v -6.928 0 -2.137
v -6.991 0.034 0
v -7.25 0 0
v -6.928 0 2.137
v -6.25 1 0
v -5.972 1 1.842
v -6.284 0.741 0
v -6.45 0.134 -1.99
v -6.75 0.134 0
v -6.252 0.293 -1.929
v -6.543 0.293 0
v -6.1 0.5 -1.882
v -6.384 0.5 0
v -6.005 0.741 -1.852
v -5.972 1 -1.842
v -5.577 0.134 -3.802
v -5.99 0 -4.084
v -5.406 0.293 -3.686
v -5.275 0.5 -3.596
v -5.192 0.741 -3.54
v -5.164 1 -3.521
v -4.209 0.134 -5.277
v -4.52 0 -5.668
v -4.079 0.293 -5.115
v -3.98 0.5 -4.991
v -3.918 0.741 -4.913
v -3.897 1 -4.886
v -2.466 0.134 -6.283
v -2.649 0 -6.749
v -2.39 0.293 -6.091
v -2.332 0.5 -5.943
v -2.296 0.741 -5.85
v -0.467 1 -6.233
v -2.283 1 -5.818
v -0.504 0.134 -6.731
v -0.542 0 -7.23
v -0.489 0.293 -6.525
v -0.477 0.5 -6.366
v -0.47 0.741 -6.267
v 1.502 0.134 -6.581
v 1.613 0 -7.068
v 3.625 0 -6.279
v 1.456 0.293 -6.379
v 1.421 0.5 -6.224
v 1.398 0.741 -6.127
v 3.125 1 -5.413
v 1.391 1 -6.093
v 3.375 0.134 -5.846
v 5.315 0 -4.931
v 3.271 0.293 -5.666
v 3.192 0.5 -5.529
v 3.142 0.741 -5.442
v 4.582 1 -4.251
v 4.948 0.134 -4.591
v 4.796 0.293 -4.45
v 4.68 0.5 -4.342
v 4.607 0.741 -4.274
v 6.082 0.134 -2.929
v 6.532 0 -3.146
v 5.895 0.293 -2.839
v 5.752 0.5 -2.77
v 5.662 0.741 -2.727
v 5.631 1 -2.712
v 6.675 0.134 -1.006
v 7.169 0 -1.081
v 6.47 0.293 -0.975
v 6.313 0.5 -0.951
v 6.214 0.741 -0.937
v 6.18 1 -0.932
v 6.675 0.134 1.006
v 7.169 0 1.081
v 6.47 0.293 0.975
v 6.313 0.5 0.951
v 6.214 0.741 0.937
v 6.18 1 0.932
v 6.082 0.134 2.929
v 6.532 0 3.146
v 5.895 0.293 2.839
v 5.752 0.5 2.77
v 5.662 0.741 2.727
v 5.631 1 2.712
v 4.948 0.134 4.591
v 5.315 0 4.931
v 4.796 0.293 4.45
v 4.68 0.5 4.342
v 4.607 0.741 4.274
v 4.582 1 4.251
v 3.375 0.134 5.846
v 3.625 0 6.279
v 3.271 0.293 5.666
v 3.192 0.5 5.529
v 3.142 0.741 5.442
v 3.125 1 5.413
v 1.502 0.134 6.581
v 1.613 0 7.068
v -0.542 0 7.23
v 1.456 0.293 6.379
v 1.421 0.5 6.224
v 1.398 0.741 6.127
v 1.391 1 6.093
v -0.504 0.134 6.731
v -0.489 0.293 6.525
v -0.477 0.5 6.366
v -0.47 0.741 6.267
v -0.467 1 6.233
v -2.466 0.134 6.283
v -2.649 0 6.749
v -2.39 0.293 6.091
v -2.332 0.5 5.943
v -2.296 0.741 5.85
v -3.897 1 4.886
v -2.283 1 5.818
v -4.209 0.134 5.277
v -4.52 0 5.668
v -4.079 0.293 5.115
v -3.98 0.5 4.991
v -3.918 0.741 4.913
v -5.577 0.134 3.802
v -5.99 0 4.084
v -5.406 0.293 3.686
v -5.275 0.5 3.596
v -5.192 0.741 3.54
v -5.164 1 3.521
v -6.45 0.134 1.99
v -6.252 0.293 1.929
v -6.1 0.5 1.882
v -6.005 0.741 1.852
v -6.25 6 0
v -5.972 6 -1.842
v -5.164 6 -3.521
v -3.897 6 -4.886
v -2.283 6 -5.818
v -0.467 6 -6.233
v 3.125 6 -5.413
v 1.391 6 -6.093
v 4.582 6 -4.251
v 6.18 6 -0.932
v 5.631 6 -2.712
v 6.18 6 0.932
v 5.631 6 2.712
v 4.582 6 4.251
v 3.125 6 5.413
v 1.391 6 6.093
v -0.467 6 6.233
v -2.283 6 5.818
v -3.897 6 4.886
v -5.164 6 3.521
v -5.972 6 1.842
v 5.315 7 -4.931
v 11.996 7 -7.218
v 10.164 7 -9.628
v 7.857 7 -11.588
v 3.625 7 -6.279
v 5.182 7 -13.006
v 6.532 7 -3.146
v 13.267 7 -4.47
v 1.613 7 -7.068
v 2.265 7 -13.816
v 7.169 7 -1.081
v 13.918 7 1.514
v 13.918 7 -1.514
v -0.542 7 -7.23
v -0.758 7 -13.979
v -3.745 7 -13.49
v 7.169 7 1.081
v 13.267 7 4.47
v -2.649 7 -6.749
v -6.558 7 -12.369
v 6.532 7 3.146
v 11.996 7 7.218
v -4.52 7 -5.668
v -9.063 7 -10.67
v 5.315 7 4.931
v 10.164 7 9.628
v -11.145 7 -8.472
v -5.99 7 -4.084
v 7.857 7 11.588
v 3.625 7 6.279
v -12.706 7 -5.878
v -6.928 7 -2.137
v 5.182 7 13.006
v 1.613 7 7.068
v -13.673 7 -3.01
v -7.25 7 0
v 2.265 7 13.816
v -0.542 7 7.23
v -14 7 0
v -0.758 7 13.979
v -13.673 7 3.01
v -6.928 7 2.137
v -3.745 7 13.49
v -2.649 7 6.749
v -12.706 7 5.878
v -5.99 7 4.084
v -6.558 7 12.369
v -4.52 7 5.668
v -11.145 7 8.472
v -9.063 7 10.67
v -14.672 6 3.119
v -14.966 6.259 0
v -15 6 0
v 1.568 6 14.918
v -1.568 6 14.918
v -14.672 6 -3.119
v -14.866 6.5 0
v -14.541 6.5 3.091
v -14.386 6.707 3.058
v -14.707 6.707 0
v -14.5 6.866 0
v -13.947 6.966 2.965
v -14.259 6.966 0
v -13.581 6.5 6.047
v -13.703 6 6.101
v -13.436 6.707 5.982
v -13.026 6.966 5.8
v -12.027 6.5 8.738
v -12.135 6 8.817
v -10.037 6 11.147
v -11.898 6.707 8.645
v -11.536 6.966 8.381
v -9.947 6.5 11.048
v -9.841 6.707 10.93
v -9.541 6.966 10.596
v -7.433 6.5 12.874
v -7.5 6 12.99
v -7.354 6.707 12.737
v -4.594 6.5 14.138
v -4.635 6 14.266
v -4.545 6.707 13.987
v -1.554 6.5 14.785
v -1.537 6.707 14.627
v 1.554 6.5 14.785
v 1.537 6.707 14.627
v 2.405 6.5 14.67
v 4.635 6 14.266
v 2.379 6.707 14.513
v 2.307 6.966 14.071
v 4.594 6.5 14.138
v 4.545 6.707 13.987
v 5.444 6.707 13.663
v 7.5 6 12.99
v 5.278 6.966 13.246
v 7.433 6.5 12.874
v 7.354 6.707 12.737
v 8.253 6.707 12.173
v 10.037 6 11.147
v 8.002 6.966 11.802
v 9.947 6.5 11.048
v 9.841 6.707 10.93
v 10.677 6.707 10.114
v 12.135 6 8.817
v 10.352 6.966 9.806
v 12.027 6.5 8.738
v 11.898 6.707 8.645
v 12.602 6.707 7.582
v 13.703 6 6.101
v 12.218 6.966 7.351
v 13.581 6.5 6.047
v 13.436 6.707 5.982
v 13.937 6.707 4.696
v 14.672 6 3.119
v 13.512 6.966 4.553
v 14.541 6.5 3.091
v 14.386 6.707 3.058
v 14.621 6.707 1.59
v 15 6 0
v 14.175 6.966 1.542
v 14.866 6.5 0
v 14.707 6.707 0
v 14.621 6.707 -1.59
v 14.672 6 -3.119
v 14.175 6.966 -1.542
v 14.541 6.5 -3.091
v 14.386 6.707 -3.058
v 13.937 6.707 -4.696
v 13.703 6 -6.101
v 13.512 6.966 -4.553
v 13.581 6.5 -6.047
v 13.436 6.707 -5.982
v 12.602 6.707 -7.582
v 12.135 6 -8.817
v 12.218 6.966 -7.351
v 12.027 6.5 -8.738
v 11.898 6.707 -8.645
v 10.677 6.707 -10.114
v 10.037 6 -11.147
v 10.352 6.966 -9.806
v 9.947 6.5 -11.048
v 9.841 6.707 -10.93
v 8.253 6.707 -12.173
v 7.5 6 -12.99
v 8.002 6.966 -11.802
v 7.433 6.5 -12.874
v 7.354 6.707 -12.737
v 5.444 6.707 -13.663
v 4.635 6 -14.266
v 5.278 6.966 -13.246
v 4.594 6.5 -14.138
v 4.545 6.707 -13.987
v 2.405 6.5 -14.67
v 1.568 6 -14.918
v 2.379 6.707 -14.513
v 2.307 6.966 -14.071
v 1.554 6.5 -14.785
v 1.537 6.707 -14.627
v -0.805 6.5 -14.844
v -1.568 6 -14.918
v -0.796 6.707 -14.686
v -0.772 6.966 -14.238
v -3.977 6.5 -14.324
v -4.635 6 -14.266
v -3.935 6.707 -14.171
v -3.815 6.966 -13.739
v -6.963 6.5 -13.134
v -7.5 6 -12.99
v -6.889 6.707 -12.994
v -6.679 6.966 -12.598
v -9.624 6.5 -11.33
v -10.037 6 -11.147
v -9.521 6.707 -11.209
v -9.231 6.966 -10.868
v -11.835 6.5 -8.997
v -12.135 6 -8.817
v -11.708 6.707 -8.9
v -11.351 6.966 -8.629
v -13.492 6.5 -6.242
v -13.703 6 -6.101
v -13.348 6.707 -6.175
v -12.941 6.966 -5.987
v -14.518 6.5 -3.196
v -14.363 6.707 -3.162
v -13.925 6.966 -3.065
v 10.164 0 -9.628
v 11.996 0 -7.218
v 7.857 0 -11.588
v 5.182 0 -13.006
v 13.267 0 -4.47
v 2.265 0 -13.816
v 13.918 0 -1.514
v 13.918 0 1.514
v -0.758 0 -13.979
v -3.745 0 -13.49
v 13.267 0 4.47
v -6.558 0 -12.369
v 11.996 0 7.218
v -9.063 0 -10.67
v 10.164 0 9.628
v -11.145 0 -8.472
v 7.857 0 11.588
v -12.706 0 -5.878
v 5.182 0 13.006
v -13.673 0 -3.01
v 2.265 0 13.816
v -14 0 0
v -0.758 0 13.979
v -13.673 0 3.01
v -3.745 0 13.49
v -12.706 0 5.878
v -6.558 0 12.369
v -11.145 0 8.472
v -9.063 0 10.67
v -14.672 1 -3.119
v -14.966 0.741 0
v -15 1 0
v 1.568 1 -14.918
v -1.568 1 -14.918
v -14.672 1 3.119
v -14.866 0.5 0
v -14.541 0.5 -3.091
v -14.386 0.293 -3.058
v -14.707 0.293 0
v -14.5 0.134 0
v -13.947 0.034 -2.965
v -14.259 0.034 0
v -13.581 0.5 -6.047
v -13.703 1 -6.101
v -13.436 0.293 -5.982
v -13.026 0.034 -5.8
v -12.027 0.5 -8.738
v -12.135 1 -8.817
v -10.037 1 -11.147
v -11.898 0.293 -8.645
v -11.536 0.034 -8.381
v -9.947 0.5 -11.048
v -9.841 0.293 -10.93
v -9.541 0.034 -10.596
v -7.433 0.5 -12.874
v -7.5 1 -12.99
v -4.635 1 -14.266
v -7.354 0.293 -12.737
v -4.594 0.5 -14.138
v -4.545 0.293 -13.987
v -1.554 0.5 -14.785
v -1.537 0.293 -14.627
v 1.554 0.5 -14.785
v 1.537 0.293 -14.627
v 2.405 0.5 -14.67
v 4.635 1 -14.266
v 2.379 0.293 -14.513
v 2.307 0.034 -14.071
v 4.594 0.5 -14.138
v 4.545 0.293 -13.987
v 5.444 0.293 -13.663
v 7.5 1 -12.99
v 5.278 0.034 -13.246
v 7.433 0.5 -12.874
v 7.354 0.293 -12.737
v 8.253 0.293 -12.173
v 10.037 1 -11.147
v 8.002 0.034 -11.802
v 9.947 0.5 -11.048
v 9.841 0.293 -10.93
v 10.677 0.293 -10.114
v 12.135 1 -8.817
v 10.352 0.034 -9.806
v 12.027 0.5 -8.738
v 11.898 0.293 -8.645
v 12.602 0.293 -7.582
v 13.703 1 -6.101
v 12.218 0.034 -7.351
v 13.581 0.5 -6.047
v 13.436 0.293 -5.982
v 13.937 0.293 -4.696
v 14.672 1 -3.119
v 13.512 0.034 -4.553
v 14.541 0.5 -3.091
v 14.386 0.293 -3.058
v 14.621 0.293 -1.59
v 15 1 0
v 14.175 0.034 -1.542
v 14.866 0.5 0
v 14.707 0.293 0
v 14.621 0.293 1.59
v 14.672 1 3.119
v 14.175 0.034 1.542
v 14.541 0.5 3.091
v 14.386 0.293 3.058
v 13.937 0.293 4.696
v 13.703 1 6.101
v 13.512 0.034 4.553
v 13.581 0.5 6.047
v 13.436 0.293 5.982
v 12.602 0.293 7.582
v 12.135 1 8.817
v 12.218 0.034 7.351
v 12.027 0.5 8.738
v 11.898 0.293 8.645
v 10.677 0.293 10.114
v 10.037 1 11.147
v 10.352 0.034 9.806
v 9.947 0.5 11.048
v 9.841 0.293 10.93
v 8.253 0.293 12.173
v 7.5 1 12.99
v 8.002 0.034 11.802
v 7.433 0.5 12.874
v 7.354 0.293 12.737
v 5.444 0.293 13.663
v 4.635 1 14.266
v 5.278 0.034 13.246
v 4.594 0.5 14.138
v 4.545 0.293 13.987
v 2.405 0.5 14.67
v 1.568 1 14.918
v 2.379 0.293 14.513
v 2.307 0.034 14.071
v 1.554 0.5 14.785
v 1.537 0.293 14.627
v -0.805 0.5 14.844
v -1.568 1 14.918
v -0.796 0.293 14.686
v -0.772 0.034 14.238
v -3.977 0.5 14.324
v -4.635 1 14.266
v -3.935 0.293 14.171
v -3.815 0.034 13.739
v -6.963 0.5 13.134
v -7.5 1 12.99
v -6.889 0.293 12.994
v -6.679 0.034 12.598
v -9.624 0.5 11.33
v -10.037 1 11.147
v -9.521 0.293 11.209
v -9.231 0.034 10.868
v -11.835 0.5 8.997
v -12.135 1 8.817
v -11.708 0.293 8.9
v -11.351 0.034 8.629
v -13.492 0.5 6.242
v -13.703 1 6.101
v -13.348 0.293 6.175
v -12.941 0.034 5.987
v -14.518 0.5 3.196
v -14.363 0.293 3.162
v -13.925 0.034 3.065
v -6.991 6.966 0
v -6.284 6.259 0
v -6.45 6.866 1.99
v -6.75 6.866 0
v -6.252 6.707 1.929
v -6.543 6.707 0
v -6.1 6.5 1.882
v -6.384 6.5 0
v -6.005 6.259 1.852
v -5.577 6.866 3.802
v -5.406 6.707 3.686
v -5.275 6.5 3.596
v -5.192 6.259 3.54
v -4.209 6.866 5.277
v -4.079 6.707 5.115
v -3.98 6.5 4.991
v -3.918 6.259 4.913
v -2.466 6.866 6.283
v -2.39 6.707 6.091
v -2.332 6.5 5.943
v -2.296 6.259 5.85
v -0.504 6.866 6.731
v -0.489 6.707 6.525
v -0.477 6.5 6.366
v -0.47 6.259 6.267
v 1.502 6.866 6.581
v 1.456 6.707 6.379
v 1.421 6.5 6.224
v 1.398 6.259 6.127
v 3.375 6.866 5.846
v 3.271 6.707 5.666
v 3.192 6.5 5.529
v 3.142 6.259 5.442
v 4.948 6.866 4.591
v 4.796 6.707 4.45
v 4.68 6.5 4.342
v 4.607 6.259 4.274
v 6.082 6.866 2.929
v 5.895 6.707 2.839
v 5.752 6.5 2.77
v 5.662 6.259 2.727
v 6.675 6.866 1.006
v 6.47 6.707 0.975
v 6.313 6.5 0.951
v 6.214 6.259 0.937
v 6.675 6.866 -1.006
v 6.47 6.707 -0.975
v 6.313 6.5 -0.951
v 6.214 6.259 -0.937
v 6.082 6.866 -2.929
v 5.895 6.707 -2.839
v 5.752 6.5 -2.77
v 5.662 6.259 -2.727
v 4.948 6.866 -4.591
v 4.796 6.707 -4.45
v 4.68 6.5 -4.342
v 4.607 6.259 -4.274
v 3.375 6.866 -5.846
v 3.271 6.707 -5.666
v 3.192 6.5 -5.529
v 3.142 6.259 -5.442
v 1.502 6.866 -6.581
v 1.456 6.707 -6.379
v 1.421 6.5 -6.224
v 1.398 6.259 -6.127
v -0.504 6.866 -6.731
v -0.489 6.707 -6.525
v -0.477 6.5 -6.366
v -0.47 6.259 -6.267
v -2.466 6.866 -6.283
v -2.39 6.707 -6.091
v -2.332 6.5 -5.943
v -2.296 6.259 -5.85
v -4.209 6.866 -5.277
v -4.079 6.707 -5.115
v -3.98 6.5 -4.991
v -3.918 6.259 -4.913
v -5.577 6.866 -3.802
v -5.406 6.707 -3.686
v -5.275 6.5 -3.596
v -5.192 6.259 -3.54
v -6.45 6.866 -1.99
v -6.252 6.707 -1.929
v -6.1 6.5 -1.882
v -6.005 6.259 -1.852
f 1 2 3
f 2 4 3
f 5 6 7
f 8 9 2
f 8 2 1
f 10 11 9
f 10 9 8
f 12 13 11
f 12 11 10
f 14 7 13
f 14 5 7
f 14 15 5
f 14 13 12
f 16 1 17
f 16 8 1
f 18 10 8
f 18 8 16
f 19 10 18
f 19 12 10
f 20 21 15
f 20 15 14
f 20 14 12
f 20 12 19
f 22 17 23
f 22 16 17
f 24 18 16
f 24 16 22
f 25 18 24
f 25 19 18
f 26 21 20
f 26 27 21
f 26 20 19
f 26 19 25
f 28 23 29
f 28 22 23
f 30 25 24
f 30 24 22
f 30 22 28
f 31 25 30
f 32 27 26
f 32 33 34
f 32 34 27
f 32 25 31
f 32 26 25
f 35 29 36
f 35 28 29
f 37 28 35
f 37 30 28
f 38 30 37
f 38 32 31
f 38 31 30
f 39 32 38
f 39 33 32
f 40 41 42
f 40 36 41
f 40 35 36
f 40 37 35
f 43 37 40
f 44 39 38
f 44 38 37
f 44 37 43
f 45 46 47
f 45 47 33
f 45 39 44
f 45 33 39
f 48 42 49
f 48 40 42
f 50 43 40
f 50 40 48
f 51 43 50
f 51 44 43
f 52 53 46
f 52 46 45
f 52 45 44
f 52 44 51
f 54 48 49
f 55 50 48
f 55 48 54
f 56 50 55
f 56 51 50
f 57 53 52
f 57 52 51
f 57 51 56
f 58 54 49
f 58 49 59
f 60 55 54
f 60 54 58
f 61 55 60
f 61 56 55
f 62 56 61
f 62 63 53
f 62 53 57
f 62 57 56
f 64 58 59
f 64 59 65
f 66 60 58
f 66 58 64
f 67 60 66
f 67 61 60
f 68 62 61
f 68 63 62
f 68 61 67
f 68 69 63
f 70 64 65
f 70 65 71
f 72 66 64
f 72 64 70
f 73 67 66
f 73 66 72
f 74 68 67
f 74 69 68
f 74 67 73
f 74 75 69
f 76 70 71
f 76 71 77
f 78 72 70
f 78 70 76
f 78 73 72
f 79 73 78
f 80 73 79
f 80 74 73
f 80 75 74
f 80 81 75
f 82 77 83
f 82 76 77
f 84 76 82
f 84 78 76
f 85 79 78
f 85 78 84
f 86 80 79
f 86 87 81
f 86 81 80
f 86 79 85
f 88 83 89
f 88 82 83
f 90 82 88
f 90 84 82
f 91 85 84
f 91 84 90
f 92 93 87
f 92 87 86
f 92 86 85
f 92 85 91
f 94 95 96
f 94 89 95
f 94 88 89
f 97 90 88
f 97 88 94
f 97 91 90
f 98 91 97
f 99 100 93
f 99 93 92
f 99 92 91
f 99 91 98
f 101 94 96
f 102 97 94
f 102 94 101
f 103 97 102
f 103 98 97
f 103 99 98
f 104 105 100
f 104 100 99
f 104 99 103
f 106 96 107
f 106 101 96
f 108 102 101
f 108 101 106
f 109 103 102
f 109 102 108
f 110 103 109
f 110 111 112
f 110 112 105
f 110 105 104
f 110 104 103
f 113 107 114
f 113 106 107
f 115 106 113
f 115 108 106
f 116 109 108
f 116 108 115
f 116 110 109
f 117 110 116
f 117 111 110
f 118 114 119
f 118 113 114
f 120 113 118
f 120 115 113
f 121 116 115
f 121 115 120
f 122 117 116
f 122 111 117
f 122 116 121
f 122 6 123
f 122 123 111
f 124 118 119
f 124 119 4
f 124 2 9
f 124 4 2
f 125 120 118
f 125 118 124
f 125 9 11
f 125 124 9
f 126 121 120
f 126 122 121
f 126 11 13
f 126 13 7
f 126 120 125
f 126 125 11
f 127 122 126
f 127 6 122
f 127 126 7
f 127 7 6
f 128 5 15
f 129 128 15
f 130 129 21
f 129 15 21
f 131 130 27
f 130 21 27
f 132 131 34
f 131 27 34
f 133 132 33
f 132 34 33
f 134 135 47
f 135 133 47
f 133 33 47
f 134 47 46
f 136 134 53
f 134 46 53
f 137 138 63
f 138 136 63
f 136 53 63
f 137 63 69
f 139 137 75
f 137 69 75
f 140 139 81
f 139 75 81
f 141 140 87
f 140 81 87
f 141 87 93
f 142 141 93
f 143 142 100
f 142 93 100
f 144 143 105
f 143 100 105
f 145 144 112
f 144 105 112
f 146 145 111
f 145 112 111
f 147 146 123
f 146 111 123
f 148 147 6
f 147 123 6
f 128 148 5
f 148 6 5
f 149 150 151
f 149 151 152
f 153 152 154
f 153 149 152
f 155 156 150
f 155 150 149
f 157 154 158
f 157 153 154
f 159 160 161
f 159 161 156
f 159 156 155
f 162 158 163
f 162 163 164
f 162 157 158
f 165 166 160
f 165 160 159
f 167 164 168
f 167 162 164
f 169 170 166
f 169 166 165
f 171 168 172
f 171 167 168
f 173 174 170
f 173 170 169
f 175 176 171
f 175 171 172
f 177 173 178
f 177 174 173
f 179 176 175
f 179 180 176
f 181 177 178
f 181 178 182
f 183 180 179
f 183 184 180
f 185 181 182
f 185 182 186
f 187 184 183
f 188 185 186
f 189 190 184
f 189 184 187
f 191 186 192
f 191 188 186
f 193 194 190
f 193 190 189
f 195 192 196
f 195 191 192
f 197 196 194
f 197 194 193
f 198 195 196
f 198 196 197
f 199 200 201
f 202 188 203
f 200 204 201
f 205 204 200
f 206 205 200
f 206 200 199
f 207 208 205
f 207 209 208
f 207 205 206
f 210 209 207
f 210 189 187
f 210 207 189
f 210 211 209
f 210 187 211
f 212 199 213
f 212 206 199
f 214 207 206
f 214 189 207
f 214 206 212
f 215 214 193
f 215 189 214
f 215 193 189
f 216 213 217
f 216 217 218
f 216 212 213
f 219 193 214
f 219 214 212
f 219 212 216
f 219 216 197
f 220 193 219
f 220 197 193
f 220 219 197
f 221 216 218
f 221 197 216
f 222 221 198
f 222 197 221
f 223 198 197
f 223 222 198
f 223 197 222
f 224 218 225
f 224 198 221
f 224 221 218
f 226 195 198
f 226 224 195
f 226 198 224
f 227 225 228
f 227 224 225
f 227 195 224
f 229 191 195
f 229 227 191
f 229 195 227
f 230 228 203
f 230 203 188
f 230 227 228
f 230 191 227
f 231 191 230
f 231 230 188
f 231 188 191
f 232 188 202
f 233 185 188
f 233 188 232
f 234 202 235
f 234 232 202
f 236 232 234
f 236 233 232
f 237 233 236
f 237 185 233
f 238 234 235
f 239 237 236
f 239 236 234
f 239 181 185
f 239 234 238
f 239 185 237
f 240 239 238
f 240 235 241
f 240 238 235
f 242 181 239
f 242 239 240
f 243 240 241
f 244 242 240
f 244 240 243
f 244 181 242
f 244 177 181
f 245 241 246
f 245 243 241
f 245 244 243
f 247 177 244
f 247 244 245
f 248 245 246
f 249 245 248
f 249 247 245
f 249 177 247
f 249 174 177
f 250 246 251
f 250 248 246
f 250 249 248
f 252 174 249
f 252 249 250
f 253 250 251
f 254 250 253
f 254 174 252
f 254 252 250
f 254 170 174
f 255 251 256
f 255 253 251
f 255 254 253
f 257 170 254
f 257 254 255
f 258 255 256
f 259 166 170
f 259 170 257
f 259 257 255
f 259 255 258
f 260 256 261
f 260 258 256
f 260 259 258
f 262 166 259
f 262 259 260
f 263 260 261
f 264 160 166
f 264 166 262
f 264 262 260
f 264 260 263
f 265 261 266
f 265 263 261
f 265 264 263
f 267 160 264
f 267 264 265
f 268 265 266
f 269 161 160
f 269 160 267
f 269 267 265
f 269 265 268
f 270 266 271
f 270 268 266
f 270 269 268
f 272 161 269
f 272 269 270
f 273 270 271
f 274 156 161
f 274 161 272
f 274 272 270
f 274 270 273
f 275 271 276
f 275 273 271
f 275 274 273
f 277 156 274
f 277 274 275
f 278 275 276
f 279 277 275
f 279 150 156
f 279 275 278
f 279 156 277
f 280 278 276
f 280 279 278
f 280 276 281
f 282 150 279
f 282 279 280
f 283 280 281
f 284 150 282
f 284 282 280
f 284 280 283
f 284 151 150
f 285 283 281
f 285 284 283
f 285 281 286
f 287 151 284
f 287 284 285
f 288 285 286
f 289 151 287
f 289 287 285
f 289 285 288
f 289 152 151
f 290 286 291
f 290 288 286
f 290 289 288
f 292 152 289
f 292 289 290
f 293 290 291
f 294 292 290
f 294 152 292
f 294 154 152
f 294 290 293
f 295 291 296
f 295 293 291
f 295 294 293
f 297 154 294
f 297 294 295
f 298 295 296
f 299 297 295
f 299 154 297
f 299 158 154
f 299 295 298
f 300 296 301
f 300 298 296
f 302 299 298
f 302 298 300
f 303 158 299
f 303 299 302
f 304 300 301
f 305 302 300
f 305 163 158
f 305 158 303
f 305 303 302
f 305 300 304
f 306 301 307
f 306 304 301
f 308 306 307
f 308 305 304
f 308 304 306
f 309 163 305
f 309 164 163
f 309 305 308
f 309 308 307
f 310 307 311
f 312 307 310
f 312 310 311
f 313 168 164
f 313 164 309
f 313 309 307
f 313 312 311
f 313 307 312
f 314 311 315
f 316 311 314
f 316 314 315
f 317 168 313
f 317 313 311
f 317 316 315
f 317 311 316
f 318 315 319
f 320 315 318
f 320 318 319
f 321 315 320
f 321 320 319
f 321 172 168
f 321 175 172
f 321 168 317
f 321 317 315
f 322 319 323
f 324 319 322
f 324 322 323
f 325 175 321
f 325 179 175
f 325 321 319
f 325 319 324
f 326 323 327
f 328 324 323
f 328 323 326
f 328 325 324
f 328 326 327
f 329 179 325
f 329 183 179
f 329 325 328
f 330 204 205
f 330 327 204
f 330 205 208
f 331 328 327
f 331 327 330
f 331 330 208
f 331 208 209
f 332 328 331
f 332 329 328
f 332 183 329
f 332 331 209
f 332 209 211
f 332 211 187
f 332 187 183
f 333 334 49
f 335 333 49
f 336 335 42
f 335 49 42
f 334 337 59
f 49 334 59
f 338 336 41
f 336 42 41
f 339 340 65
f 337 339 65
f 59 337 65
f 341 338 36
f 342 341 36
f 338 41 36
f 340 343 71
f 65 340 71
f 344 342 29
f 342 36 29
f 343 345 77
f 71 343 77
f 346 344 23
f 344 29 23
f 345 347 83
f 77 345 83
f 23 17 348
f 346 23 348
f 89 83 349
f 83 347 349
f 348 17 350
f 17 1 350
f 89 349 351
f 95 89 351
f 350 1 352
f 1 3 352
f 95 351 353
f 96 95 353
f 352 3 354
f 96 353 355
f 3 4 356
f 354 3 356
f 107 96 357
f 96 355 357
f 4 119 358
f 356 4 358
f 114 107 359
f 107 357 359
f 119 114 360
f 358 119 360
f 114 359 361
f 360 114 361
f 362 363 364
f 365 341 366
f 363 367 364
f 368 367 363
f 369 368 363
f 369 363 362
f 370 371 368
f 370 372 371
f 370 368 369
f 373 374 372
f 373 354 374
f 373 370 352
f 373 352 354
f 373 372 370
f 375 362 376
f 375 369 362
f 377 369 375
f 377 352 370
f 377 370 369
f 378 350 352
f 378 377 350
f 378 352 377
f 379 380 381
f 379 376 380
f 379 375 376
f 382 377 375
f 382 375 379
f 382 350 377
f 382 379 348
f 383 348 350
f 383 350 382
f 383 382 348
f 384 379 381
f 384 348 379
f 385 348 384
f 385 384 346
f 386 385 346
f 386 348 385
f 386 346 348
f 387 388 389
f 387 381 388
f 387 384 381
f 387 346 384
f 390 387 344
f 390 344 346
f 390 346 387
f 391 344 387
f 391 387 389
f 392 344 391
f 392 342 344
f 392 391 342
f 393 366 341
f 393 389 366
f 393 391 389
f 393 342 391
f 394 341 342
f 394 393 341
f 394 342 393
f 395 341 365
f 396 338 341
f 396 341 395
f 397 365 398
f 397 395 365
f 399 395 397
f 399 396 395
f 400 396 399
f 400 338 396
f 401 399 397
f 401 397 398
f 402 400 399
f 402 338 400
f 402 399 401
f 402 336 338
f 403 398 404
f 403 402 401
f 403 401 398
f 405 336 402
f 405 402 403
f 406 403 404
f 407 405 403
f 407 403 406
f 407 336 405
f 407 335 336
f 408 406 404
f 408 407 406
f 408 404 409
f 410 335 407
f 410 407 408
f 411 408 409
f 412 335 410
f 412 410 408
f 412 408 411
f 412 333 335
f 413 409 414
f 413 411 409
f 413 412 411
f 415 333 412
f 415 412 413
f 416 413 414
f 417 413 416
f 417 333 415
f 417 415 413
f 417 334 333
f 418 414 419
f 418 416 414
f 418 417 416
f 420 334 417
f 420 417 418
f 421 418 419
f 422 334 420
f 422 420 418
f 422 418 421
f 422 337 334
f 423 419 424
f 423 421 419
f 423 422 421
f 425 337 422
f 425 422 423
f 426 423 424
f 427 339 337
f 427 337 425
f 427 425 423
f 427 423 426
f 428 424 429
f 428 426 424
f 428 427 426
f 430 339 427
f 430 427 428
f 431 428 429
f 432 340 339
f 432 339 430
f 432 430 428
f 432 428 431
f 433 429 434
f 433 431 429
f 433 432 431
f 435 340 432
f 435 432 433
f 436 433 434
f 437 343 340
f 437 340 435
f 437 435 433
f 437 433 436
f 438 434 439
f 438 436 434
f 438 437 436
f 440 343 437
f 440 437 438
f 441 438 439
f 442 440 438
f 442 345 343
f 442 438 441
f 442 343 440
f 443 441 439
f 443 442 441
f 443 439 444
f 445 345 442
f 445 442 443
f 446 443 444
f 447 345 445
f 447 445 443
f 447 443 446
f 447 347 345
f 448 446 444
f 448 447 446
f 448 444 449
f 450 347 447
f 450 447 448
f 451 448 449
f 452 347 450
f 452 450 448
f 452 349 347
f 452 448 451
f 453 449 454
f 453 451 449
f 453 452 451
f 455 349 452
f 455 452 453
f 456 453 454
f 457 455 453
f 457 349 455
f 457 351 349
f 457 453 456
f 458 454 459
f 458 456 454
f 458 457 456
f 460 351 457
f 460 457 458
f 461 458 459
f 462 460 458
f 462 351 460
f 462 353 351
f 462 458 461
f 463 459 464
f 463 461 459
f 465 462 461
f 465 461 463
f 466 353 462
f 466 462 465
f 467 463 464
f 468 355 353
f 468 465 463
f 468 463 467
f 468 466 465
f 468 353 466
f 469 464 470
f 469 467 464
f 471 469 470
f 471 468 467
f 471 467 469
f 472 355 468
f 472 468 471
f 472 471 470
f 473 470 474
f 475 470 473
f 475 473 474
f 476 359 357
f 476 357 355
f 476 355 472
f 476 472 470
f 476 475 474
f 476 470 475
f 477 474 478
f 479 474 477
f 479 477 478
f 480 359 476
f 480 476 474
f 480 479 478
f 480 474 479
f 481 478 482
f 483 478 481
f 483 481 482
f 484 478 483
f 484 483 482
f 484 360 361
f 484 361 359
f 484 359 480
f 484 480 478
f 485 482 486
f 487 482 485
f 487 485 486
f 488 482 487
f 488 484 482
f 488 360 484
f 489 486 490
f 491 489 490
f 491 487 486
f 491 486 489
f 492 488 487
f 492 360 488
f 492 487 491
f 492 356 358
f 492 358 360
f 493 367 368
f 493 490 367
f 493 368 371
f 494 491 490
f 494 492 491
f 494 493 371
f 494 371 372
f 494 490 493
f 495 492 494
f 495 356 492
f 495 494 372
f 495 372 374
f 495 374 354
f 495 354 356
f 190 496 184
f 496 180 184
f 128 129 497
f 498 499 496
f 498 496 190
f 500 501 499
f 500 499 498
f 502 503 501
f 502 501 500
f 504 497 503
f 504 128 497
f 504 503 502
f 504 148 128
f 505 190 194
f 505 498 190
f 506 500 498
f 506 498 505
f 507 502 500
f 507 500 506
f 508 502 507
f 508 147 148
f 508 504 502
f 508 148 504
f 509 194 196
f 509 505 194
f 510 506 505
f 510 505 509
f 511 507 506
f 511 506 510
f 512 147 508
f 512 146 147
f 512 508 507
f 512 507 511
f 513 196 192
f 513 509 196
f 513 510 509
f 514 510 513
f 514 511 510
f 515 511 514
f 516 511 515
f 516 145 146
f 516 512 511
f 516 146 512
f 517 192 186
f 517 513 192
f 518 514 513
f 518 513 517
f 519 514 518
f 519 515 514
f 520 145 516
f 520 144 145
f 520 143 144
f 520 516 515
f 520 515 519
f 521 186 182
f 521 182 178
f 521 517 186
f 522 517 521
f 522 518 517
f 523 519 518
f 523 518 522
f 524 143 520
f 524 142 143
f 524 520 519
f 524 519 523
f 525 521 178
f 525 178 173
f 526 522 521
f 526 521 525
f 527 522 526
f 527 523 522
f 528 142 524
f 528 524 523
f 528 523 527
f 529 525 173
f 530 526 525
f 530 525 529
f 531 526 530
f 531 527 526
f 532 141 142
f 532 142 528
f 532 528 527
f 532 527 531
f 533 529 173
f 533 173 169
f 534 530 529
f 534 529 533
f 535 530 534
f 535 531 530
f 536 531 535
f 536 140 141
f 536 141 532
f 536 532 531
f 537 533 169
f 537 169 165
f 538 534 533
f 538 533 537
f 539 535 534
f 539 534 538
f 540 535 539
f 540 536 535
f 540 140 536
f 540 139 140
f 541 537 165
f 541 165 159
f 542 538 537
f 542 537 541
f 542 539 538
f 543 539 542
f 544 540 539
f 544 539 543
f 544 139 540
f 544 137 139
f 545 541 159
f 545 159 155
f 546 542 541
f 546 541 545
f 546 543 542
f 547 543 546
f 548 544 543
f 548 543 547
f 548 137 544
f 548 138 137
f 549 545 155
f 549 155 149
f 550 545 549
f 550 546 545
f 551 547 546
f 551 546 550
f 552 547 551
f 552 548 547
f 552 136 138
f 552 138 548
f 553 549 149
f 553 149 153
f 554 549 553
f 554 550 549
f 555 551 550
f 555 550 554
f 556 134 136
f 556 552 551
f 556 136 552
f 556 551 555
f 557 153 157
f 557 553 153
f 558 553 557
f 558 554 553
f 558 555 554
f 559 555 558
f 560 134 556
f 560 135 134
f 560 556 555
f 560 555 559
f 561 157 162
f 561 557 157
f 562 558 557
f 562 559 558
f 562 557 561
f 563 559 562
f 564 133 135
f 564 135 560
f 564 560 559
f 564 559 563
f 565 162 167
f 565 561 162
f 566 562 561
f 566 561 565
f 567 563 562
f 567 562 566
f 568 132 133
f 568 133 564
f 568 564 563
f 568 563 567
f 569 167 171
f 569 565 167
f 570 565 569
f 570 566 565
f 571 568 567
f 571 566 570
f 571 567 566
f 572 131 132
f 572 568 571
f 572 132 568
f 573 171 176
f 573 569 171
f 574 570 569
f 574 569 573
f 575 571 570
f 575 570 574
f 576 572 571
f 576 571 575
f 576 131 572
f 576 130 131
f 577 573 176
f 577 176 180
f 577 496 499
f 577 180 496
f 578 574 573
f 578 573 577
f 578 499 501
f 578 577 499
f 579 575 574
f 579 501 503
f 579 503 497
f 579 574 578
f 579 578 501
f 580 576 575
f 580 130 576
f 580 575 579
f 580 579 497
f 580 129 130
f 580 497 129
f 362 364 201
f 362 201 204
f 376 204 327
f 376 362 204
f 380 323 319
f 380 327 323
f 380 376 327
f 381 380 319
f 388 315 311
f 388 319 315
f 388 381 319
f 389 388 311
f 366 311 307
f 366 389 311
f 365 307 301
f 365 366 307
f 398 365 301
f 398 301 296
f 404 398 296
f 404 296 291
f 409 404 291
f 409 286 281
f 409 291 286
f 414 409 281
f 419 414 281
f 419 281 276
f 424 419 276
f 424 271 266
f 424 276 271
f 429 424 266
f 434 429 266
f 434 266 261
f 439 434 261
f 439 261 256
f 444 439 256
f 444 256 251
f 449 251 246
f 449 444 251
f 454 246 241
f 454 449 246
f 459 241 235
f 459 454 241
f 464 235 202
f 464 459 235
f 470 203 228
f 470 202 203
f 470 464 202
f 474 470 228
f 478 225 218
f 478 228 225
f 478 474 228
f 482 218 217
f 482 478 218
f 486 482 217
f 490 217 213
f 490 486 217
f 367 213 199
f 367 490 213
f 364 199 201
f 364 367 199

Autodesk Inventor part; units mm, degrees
ref_plane "YZ Plane" through (0, 0, 0) normal (1, 0, 0) x (0, 1, 0)
ref_plane "XZ Plane" through (0, 0, 0) normal (0, 1, 0) x (-1, 0, 0)
ref_plane "XY Plane" through (0, 0, 0) normal (0, 0, 1) x (1, 0, 0)
sketch "Sketch1" plane through (0, 0, 0) normal (0, 1, 0) x (-1, 0, 0)
  circle A0 centre (0, 0) radius 6.25
  circle A1 centre (0, 0) radius 15
  dimension "d0" = 12.5
  dimension "d1" = 30
extrude "Extrusion1" add sketch "Sketch1" along normal blind 7
fillet "Fillet1" radius 1 2 edges at (15, 7, 0) (15, 0, 0)
fillet "Fillet2" radius 1 2 edges at (6.25, 7, 0) (6.25, 0, 0)
properties part number "wheel"
